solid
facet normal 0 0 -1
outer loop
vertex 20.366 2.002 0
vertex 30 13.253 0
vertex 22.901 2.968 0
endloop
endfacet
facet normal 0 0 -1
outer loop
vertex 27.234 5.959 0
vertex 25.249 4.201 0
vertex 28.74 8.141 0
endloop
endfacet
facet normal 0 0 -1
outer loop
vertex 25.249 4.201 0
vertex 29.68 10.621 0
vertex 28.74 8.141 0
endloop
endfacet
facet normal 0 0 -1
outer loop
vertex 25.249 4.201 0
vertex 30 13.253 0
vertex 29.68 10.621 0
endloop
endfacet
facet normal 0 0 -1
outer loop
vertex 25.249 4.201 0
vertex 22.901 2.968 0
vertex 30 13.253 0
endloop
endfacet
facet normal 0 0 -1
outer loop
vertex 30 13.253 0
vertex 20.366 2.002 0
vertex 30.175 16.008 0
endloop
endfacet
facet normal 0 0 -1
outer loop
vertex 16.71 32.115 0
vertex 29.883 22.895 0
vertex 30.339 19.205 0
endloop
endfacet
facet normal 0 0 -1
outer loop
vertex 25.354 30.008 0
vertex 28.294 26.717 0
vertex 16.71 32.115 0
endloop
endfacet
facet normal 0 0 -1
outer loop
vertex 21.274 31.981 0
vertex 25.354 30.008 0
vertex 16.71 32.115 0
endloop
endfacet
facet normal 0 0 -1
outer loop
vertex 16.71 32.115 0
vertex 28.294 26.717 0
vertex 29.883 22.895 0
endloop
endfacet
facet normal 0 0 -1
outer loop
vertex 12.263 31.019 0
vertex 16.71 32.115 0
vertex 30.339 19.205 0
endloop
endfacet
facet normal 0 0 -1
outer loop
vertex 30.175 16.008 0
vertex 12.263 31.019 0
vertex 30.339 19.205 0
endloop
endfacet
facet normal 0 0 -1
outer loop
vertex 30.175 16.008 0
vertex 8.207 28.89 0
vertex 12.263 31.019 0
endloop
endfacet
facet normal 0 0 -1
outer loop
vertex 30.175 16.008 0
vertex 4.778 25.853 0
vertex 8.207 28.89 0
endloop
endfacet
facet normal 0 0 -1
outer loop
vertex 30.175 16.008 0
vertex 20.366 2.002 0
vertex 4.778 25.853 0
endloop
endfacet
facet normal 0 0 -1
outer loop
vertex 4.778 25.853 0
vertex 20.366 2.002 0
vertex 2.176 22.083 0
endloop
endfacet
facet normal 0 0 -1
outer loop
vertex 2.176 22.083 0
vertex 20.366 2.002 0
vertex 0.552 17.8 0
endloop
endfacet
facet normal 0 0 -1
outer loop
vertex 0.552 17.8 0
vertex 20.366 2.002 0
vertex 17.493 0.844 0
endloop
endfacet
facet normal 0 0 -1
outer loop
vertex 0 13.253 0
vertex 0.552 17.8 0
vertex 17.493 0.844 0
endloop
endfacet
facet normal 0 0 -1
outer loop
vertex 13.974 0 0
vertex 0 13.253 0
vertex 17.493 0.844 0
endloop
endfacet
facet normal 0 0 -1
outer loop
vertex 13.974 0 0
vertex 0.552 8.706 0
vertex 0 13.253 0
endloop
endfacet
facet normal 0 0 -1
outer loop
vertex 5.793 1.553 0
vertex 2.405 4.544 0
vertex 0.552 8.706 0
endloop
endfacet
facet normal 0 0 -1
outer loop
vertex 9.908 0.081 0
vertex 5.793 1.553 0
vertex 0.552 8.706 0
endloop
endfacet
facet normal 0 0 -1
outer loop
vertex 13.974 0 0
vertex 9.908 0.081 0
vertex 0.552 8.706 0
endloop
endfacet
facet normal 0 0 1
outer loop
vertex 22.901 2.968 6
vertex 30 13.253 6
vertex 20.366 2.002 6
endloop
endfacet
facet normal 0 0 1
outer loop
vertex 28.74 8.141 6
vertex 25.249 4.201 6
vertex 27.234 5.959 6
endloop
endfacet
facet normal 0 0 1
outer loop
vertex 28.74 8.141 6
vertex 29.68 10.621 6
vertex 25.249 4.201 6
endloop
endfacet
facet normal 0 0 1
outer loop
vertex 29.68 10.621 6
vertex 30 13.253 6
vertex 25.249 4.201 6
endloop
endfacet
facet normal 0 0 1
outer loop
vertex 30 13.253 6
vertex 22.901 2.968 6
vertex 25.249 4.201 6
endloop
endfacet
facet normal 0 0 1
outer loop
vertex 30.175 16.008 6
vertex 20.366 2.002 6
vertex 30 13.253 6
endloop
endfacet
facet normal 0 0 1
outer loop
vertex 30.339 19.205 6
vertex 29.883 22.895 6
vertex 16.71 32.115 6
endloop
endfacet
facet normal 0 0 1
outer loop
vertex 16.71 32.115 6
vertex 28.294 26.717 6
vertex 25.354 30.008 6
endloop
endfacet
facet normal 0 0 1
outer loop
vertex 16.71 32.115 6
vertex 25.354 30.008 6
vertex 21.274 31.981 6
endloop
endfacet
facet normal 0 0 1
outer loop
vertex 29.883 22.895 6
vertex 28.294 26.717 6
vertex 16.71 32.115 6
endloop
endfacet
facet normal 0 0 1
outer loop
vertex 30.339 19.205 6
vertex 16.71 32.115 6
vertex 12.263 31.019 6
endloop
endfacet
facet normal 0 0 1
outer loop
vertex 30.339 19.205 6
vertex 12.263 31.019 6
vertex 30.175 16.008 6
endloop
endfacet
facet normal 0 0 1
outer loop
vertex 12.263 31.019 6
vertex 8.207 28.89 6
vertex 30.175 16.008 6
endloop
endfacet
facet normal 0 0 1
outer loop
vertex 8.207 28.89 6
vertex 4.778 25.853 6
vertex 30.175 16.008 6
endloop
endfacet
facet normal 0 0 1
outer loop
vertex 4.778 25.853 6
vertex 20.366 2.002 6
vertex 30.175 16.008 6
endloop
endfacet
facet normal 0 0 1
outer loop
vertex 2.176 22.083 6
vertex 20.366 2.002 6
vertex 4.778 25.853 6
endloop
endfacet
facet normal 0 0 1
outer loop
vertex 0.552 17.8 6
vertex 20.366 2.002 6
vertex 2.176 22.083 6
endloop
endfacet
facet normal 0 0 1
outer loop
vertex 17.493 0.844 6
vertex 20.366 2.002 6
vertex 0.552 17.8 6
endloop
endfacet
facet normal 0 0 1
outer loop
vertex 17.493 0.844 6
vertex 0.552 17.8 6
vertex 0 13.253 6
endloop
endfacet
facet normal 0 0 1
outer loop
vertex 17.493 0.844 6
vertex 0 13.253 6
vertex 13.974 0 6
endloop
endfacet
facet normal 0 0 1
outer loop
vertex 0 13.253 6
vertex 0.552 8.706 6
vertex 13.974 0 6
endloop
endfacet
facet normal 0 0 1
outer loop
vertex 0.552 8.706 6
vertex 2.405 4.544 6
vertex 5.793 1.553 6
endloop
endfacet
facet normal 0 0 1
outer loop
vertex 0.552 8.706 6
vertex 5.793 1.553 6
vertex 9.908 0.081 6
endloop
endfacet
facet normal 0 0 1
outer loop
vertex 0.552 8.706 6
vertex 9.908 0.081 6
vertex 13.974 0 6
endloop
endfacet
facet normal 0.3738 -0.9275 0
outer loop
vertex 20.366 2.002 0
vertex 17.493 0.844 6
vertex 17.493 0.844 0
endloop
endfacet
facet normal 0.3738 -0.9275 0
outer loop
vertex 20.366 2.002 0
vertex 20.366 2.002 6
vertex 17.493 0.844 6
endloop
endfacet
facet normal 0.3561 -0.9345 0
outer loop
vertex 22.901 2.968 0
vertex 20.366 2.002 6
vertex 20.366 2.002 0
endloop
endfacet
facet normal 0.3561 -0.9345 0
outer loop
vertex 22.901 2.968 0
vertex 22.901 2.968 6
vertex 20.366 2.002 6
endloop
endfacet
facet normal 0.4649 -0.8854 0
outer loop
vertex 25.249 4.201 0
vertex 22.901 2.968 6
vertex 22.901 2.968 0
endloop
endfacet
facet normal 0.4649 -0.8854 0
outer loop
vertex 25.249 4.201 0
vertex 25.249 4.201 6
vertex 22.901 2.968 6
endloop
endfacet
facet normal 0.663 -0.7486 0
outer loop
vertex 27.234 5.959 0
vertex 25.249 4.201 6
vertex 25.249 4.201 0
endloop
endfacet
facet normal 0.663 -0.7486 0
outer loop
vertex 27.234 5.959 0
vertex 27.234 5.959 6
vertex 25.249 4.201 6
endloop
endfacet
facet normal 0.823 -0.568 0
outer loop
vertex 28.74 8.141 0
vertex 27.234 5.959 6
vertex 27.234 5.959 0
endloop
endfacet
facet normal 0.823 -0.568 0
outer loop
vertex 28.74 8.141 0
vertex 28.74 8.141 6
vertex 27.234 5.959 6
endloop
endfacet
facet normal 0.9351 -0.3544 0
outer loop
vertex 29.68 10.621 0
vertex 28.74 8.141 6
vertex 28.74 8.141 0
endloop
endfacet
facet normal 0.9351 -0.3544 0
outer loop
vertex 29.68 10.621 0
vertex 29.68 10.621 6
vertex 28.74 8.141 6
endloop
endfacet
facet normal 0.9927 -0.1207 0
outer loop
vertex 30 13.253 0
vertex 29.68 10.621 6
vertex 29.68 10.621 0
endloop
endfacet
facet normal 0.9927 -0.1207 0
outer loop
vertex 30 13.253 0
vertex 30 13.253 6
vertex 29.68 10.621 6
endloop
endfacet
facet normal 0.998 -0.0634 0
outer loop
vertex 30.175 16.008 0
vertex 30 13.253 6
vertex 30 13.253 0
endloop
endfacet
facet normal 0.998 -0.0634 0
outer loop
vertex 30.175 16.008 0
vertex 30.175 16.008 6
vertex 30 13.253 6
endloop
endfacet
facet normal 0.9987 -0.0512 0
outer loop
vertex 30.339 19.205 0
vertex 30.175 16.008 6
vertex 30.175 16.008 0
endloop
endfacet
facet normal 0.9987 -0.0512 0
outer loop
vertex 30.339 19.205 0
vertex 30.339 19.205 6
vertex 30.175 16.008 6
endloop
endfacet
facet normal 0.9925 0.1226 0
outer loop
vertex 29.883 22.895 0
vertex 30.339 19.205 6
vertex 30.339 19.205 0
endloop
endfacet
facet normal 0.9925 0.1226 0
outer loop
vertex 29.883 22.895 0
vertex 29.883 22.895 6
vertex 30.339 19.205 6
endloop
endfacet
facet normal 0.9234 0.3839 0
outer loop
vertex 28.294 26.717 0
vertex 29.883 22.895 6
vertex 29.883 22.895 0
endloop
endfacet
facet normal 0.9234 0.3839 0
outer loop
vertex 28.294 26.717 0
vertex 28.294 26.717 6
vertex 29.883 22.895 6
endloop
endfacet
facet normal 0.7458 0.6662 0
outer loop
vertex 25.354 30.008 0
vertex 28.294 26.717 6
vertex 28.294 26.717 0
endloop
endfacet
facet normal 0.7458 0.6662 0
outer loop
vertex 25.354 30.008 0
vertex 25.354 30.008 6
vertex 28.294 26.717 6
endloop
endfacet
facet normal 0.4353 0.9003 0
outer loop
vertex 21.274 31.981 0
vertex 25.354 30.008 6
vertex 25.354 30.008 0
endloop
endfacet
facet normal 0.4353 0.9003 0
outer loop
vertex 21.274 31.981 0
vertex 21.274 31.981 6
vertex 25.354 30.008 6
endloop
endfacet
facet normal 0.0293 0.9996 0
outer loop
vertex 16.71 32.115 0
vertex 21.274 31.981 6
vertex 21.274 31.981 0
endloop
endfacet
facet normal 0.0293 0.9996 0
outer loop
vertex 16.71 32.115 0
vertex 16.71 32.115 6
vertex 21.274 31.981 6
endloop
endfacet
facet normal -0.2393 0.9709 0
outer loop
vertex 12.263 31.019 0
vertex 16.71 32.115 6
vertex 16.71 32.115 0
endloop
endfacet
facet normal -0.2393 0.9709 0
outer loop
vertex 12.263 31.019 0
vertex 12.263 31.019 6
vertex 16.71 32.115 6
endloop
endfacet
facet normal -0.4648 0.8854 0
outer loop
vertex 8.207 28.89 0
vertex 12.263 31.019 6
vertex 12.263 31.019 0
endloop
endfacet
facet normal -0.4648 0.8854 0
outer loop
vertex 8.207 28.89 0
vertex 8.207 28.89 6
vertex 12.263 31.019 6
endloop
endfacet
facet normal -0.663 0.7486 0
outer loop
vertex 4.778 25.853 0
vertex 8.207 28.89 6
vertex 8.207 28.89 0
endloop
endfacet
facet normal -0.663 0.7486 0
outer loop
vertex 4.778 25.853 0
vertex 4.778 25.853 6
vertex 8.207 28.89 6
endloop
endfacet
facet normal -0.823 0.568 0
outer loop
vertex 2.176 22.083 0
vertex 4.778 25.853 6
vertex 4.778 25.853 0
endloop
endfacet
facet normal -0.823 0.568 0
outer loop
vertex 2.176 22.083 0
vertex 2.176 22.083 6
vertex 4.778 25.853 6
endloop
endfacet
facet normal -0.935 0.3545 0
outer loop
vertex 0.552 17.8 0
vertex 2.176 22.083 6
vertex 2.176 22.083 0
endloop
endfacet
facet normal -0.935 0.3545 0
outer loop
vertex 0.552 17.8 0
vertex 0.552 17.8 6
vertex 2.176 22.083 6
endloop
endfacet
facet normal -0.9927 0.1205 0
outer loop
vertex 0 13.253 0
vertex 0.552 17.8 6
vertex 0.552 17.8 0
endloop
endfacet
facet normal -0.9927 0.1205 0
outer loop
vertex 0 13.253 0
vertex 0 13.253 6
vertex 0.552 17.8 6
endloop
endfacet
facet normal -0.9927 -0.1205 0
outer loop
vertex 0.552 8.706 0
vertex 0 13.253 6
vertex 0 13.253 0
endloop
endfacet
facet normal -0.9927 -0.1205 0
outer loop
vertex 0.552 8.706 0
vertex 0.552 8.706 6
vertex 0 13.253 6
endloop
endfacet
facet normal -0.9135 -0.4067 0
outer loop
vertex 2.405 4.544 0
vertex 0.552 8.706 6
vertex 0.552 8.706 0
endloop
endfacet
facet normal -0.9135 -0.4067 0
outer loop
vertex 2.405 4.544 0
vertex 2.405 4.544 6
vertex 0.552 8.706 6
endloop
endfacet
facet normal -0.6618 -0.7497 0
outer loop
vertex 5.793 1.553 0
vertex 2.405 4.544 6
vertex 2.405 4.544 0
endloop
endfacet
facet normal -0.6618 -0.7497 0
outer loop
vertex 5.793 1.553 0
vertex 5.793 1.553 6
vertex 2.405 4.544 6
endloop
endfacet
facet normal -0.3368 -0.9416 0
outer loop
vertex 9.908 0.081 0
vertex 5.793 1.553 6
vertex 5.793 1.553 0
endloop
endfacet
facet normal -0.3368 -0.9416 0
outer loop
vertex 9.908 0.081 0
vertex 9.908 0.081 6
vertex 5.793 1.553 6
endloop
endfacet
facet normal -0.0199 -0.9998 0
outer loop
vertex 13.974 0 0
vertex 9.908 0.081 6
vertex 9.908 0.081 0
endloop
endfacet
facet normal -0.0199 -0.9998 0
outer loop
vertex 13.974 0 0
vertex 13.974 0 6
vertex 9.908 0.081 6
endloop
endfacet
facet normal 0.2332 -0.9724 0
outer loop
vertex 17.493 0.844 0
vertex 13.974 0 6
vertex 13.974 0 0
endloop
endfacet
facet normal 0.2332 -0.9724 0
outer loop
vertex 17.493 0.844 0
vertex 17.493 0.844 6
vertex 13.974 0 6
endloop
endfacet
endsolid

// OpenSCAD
$fn = 32;

// ----------------------------------------------------------------------
// Cam disc: base radius 11.0 mm, lift 8.0 mm, 26 profile points
// ----------------------------------------------------------------------

// --- parameters (mm) ---
profile_height = 6;       // extrusion height
profile_points = 26;      // points of the closed outline

profile = [[30, 13.253], [30.175, 16.008], [30.339, 19.205], [29.883, 22.895], [28.294, 26.717], [25.354, 30.008], [21.274, 31.981], [16.71, 32.115], [12.263, 31.019], [8.207, 28.89], [4.778, 25.853], [2.176, 22.083], [0.552, 17.8], [0, 13.253], [0.552, 8.706], [2.405, 4.544], [5.793, 1.553], [9.908, 0.081], [13.974, 0], [17.493, 0.844], [20.366, 2.002], [22.901, 2.968], [25.249, 4.201], [27.234, 5.959], [28.74, 8.141], [29.68, 10.621]];  // single closed polygon, 26 points, counter clockwise

// --- the one profile operation ---
linear_extrude(height = profile_height) polygon(points = profile);
